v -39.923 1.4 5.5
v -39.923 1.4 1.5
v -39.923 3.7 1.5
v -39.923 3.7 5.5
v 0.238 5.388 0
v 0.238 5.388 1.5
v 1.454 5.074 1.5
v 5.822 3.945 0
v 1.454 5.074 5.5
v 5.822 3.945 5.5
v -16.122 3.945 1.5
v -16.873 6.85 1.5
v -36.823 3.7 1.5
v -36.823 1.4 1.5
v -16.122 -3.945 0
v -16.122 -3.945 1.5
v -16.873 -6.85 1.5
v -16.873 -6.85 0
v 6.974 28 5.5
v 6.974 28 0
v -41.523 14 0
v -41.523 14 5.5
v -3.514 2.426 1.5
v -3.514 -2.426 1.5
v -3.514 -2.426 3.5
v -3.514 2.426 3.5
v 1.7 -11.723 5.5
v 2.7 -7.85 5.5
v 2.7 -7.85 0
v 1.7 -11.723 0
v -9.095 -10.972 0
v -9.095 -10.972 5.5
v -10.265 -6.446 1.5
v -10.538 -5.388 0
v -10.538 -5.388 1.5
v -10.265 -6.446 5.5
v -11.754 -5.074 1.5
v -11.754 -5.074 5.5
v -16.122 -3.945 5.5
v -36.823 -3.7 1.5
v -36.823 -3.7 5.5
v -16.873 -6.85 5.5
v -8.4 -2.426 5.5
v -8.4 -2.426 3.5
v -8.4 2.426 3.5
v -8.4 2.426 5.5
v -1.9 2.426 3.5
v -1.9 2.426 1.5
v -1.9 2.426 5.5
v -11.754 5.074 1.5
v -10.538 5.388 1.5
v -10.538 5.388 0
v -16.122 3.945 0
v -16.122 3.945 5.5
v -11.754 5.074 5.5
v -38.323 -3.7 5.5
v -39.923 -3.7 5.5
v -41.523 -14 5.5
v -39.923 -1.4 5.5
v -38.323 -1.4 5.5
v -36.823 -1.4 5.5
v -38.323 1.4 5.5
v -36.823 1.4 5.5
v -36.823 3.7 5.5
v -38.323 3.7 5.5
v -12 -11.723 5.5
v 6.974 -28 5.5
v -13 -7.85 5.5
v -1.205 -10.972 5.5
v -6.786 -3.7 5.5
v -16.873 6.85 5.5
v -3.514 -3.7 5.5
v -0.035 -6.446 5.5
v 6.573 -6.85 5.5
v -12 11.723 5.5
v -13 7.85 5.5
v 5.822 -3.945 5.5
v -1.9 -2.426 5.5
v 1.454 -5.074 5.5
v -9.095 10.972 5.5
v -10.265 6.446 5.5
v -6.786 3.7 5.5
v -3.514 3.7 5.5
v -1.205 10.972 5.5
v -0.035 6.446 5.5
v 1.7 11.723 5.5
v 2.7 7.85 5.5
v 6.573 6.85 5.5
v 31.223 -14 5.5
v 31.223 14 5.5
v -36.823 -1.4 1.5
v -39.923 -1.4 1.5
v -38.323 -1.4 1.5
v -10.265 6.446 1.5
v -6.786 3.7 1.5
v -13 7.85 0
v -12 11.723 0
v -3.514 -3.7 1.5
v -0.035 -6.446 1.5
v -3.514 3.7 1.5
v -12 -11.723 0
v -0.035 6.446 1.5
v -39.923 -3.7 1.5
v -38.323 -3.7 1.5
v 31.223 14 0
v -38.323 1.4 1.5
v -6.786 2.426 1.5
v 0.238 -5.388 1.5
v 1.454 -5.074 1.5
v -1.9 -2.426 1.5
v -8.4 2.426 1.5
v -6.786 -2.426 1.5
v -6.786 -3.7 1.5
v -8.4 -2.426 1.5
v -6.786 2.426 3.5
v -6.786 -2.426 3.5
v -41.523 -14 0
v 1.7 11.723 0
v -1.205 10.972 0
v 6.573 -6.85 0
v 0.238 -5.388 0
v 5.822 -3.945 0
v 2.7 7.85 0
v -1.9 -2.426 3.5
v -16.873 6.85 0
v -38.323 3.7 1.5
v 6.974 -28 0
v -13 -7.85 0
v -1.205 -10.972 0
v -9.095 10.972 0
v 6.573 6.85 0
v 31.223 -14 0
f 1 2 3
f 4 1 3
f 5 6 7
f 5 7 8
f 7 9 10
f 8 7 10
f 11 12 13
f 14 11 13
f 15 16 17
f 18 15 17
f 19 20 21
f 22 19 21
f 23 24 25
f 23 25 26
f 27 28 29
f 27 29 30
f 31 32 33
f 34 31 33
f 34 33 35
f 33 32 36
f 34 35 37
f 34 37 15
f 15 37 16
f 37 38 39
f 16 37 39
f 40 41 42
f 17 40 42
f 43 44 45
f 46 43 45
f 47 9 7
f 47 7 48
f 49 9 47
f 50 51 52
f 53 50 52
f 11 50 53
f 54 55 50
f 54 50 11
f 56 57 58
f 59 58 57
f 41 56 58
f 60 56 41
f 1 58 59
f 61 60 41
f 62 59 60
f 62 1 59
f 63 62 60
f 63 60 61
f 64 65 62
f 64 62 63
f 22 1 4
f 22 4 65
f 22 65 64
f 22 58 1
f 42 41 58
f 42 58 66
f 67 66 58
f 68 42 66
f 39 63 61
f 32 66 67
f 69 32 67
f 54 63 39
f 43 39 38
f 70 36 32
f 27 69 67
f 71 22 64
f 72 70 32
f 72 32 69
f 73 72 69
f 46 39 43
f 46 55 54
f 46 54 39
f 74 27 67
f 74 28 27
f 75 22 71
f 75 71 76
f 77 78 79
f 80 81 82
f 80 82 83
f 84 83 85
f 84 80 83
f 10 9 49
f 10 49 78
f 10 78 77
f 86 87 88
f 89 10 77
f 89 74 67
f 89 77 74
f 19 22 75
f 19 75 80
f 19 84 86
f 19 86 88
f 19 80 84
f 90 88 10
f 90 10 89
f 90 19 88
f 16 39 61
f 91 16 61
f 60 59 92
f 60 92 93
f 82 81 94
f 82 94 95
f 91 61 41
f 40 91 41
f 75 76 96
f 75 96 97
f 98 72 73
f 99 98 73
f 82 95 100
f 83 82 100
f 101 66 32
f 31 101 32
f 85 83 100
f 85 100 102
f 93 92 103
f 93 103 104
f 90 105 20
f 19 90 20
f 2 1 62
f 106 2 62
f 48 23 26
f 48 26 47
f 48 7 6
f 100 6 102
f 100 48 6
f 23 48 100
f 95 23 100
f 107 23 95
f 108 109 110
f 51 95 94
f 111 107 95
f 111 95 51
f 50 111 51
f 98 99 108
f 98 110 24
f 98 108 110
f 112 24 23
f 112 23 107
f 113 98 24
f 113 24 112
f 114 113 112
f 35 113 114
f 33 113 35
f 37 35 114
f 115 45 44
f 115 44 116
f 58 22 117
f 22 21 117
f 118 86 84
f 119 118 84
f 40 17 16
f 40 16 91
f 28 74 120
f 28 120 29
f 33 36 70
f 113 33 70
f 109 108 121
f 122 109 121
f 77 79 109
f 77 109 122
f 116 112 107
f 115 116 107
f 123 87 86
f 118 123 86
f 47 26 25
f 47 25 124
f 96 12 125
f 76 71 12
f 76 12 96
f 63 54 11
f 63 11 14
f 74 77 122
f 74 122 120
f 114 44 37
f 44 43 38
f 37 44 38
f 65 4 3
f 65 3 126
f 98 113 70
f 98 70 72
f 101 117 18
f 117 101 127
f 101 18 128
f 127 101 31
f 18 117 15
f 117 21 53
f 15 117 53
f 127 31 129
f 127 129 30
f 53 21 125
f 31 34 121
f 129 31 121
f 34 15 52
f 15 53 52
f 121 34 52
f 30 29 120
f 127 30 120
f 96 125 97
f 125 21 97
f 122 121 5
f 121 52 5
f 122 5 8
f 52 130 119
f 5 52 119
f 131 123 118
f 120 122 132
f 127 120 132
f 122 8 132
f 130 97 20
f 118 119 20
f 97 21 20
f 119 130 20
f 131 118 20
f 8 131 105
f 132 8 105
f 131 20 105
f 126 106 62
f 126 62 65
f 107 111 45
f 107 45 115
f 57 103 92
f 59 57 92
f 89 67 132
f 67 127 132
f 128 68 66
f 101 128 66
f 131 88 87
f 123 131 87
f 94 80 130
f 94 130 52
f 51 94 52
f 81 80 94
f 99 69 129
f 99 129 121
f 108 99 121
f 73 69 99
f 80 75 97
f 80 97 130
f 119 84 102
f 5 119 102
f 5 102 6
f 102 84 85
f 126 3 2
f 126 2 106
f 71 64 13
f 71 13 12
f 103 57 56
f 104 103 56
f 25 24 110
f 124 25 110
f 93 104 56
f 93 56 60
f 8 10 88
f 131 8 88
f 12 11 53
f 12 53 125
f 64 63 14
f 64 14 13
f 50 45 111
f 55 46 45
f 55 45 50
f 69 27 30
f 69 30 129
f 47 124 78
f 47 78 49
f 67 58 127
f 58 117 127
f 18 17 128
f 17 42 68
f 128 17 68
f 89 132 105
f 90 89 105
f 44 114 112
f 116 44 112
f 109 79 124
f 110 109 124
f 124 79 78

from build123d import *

# Parameters (mm, degrees)
BOSS_EXTRUDE1_DEPTH  = 1.5
BOSS_EXTRUDE2_START  = 1.5
SKETCH1_3_W          = 6.5
SKETCH1_3_H          = 7.4
SKETCH1_3_W_2        = 1.6
SKETCH1_3_H_2        = 2.3
BOSS_EXTRUDE2_DEPTH  = 4
CUT_EXTRUDE1_DEPTH   = 5.5
MIRROR2_COPY_1_DEPTH = 5.5
CUT_EXTRUDE2_DEPTH   = 4
SKETCH6_W            = 1.613740729
SKETCH6_H            = 4.851761748
BOSS_EXTRUDE3_DEPTH  = 2


with BuildPart() as part:
    # Sketch1 → Boss-Extrude1 (new body)
    with BuildSketch(Plane.XY):
        Polygon((6.974355653, -28), (31.223066959, -14), (31.223066959, 14), (6.974355653, 28), (-41.523066959, 14), (-41.523066959, -14), align=None)
    extrude(amount=BOSS_EXTRUDE1_DEPTH)

    # Sketch1<3> → Boss-Extrude2 (add)
    with BuildSketch(Plane.XY.offset(BOSS_EXTRUDE2_START)):
        Polygon((6.974355653, 28), (-41.523066959, 14), (-41.523066959, -14), (6.974355653, -28), (31.223066959, -14), (31.223066959, 14), align=None)
        with Locations((-5.15, 0)):
            Rectangle(SKETCH1_3_W, SKETCH1_3_H, mode=Mode.SUBTRACT)
        with Locations((-39.123066959, -2.55)):
            Rectangle(SKETCH1_3_W_2, SKETCH1_3_H_2, mode=Mode.SUBTRACT)
        with Locations((-39.123066959, 2.55)):
            Rectangle(SKETCH1_3_W_2, SKETCH1_3_H_2, mode=Mode.SUBTRACT)
    extrude(amount=BOSS_EXTRUDE2_DEPTH)

    # WireCutExtrude → Cut-Extrude1 (cut)
    with BuildSketch(Plane.XY.offset(5.5)):
        Polygon((-9.094946311, 10.972481296), (-10.538213003, 5.388213003), (-16.122481296, 3.944946311), (-16.873171174, 6.849505608), (-13.000425446, 7.850425446), (-11.999505608, 11.723171174), align=None)
    cut_extrude1 = extrude(amount=-CUT_EXTRUDE1_DEPTH, mode=Mode.SUBTRACT)

    # Mirror1: Cut-Extrude1 across plane
    add(cut_extrude1.mirror(Plane(origin=(0, 0, 0), x_dir=(0, 0, 1), z_dir=(0, -1, 0))), mode=Mode.SUBTRACT)

    # Mirror2: Cut-Extrude1 across plane
    add(cut_extrude1.mirror(Plane(origin=(-5.15, 0, 0), x_dir=(0, 0, 1), z_dir=(1, 0, 0))), mode=Mode.SUBTRACT)

    # Mirror2 copy 1 sketch → Mirror2 copy 1 (cut)
    with BuildSketch(Plane(origin=(-10.3, 0, 5.5), x_dir=(-1, 0, 0), z_dir=(0, 0, 1))):
        Polygon((-9.094946311, 10.972481296), (-10.538213003, 5.388213003), (-16.122481296, 3.944946311), (-16.873171174, 6.849505608), (-13.000425446, 7.850425446), (-11.999505608, 11.723171174), align=None)
    extrude(amount=-MIRROR2_COPY_1_DEPTH, mode=Mode.SUBTRACT)

    # Sketch5 → Cut-Extrude2 (cut)
    with BuildSketch(Plane.XY.offset(5.5)):
        Polygon((-10.264722381, 6.44639928), (-6.786259271, 3.7), (-8.4, 3.7), (-8.4, 2.425880874), (-11.753980013, 5.073995286), (-10.538213003, 5.388213003), align=None)
        Polygon((-3.513740729, 3.7), (-0.035277619, 6.44639928), (0.238213003, 5.388213003), (1.453980013, 5.073995286), (-1.9, 2.425880874), (-1.9, 3.7), align=None)
        Polygon((-36.823066959, 1.4), (-36.823066959, 3.7), (-16.873171174, 6.849505608), (-16.122481296, 3.944946311), align=None)
    cut_extrude2 = extrude(amount=-CUT_EXTRUDE2_DEPTH, mode=Mode.SUBTRACT)

    # Mirror3: Cut-Extrude2 across plane
    add(cut_extrude2.mirror(Plane(origin=(0, 0, 0), x_dir=(0, 0, 1), z_dir=(0, -1, 0))), mode=Mode.SUBTRACT)

    # Sketch6 → Boss-Extrude3 (add)
    with BuildSketch(Plane.XY.offset(1.5)):
        with Locations((-2.706870365, 0)):
            Rectangle(SKETCH6_W, SKETCH6_H)
        with Locations((-7.593129636, 0)):
            Rectangle(SKETCH6_W, SKETCH6_H)
    extrude(amount=BOSS_EXTRUDE3_DEPTH)


solid = part.part
